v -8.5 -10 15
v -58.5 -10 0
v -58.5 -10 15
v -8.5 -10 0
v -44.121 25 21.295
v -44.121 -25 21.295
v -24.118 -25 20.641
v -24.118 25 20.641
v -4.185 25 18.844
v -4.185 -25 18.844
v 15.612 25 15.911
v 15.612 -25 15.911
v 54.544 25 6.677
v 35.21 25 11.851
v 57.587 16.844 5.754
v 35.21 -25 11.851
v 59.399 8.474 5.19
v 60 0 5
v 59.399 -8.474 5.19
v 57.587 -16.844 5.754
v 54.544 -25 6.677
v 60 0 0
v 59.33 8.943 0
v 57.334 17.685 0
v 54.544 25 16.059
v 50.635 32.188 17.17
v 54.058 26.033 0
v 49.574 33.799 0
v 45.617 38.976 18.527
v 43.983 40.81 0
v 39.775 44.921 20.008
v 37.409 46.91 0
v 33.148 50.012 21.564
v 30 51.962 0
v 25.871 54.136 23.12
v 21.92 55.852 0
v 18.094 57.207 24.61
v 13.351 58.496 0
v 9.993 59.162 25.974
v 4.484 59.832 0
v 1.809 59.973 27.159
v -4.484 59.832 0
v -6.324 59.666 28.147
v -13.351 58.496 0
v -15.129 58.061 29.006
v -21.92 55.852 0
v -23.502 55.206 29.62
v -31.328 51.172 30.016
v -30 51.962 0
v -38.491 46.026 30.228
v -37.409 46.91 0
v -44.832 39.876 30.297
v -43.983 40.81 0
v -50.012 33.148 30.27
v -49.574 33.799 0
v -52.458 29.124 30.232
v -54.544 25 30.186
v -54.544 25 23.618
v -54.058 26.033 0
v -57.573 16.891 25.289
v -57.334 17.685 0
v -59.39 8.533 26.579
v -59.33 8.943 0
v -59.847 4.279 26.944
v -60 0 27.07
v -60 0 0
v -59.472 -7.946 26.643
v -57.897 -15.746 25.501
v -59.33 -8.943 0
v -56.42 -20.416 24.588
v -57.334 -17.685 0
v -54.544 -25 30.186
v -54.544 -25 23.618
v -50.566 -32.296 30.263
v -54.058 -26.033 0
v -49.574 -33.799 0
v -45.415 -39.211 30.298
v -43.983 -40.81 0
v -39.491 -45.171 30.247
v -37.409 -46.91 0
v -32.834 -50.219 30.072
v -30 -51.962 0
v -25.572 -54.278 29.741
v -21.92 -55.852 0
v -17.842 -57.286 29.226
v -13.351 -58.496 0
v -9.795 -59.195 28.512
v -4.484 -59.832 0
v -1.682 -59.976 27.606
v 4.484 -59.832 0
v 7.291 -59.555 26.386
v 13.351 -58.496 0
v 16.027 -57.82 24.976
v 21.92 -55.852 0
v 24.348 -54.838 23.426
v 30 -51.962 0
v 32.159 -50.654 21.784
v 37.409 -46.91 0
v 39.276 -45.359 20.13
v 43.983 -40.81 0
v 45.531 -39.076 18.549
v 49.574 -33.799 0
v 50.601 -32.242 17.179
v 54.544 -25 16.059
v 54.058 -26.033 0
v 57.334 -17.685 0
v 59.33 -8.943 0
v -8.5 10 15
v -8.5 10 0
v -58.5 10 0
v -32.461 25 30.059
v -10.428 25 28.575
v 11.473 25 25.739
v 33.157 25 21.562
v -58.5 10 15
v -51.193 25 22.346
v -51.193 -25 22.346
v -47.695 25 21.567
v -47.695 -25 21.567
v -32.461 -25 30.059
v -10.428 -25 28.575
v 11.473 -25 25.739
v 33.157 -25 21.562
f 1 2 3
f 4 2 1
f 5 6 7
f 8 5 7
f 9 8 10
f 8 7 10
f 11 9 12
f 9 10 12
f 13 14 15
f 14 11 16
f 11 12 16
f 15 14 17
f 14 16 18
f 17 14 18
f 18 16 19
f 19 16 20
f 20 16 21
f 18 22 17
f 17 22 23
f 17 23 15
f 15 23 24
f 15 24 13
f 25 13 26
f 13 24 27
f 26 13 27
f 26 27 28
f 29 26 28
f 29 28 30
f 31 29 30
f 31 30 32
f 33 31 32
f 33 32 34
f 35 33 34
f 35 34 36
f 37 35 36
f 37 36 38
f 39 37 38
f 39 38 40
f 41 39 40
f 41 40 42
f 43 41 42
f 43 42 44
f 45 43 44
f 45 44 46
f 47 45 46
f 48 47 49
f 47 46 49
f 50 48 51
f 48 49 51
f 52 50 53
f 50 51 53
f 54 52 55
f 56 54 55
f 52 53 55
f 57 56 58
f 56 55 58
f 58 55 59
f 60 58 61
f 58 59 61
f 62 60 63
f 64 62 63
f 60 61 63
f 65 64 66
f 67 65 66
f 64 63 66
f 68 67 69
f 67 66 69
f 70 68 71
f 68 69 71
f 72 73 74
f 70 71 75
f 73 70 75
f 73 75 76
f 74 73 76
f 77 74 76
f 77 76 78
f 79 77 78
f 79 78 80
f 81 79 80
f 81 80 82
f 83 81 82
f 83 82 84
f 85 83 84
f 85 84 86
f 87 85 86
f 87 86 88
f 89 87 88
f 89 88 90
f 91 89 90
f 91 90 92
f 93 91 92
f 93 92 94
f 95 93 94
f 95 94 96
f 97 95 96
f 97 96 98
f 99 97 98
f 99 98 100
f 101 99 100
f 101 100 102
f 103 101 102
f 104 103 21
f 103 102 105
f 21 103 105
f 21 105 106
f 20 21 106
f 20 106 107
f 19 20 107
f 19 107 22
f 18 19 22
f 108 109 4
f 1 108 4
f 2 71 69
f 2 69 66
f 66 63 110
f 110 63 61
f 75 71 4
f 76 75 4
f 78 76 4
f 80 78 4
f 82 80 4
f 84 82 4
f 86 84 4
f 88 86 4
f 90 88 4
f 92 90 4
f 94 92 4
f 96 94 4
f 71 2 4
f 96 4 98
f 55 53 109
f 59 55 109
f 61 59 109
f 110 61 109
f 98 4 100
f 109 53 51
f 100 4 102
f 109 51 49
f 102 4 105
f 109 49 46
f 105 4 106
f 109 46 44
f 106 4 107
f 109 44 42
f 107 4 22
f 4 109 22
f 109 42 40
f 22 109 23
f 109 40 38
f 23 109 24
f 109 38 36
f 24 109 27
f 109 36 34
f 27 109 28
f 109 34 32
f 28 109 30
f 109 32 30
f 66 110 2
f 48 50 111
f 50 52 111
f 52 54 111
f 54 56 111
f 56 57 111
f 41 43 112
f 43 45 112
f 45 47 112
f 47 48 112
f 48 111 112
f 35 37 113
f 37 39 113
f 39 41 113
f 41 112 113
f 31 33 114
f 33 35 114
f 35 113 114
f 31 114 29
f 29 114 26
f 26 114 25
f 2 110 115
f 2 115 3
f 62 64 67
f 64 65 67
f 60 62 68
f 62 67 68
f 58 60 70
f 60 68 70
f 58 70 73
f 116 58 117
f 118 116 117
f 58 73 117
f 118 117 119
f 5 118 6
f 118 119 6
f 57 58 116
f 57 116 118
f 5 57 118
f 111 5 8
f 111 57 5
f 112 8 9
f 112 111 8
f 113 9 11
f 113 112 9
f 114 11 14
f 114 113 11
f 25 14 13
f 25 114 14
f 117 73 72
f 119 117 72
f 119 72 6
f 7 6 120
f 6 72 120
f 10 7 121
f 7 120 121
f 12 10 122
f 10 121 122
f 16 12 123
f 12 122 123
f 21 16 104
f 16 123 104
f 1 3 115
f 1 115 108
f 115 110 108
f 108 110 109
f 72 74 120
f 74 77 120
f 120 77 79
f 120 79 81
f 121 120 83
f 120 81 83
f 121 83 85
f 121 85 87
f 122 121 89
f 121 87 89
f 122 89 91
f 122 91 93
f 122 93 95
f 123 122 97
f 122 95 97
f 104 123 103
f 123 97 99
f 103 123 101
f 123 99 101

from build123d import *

# Parameters (mm, degrees)
F0_R     = 60
F1_DEPTH = 40
F3_DEPTH = 100
F4_DEPTH = 25
F5_W     = 50
F5_H     = 20
F6_DEPTH = 15


with BuildPart() as f1:
    # F0 (on Top) → F1 (new body)
    with BuildSketch(Plane.XY):
        Circle(F0_R)
    extrude(amount=F1_DEPTH)

    # F2 (on Front) → F3 (cut, symmetric)
    with BuildSketch(Plane.XZ):
        with BuildLine():
            ThreePointArc((-60, 30.007477), (0.661156, 27.310043), (60, 14.427749))
            Line((60, 14.427749), (60, 41.473642))
            Line((60, 41.473642), (-60, 41.473642))
            Line((-60, 41.473642), (-60, 30.007477))
        make_face()
    extrude(amount=F3_DEPTH, both=True, mode=Mode.SUBTRACT)

    # F2 (on Front) → F4 (cut, symmetric)
    with BuildSketch(Plane.XZ):
        with BuildLine():
            ThreePointArc((-44.121098, 21.295034), (8.556291, 17.088967), (60, 5))
            Line((60, 5), (60, 14.427749))
            ThreePointArc((60, 14.427749), (0.661156, 27.310043), (-60, 30.007477))
            Line((-60, 30.007477), (-60, 27.070224))
            ThreePointArc((-60, 27.070224), (-52.563238, 22.800483), (-44.121098, 21.295034))
        make_face()
    extrude(amount=F4_DEPTH, both=True, mode=Mode.SUBTRACT)

    # F5 (on face) → F6 (cut)
    with BuildSketch(Plane(origin=(0, 0, 0), x_dir=(1, 0, 0), z_dir=(0, 0, -1))):
        with Locations((-33.5, 0)):
            Rectangle(F5_W, F5_H)
    extrude(amount=-F6_DEPTH, mode=Mode.SUBTRACT)


solid = f1.part
